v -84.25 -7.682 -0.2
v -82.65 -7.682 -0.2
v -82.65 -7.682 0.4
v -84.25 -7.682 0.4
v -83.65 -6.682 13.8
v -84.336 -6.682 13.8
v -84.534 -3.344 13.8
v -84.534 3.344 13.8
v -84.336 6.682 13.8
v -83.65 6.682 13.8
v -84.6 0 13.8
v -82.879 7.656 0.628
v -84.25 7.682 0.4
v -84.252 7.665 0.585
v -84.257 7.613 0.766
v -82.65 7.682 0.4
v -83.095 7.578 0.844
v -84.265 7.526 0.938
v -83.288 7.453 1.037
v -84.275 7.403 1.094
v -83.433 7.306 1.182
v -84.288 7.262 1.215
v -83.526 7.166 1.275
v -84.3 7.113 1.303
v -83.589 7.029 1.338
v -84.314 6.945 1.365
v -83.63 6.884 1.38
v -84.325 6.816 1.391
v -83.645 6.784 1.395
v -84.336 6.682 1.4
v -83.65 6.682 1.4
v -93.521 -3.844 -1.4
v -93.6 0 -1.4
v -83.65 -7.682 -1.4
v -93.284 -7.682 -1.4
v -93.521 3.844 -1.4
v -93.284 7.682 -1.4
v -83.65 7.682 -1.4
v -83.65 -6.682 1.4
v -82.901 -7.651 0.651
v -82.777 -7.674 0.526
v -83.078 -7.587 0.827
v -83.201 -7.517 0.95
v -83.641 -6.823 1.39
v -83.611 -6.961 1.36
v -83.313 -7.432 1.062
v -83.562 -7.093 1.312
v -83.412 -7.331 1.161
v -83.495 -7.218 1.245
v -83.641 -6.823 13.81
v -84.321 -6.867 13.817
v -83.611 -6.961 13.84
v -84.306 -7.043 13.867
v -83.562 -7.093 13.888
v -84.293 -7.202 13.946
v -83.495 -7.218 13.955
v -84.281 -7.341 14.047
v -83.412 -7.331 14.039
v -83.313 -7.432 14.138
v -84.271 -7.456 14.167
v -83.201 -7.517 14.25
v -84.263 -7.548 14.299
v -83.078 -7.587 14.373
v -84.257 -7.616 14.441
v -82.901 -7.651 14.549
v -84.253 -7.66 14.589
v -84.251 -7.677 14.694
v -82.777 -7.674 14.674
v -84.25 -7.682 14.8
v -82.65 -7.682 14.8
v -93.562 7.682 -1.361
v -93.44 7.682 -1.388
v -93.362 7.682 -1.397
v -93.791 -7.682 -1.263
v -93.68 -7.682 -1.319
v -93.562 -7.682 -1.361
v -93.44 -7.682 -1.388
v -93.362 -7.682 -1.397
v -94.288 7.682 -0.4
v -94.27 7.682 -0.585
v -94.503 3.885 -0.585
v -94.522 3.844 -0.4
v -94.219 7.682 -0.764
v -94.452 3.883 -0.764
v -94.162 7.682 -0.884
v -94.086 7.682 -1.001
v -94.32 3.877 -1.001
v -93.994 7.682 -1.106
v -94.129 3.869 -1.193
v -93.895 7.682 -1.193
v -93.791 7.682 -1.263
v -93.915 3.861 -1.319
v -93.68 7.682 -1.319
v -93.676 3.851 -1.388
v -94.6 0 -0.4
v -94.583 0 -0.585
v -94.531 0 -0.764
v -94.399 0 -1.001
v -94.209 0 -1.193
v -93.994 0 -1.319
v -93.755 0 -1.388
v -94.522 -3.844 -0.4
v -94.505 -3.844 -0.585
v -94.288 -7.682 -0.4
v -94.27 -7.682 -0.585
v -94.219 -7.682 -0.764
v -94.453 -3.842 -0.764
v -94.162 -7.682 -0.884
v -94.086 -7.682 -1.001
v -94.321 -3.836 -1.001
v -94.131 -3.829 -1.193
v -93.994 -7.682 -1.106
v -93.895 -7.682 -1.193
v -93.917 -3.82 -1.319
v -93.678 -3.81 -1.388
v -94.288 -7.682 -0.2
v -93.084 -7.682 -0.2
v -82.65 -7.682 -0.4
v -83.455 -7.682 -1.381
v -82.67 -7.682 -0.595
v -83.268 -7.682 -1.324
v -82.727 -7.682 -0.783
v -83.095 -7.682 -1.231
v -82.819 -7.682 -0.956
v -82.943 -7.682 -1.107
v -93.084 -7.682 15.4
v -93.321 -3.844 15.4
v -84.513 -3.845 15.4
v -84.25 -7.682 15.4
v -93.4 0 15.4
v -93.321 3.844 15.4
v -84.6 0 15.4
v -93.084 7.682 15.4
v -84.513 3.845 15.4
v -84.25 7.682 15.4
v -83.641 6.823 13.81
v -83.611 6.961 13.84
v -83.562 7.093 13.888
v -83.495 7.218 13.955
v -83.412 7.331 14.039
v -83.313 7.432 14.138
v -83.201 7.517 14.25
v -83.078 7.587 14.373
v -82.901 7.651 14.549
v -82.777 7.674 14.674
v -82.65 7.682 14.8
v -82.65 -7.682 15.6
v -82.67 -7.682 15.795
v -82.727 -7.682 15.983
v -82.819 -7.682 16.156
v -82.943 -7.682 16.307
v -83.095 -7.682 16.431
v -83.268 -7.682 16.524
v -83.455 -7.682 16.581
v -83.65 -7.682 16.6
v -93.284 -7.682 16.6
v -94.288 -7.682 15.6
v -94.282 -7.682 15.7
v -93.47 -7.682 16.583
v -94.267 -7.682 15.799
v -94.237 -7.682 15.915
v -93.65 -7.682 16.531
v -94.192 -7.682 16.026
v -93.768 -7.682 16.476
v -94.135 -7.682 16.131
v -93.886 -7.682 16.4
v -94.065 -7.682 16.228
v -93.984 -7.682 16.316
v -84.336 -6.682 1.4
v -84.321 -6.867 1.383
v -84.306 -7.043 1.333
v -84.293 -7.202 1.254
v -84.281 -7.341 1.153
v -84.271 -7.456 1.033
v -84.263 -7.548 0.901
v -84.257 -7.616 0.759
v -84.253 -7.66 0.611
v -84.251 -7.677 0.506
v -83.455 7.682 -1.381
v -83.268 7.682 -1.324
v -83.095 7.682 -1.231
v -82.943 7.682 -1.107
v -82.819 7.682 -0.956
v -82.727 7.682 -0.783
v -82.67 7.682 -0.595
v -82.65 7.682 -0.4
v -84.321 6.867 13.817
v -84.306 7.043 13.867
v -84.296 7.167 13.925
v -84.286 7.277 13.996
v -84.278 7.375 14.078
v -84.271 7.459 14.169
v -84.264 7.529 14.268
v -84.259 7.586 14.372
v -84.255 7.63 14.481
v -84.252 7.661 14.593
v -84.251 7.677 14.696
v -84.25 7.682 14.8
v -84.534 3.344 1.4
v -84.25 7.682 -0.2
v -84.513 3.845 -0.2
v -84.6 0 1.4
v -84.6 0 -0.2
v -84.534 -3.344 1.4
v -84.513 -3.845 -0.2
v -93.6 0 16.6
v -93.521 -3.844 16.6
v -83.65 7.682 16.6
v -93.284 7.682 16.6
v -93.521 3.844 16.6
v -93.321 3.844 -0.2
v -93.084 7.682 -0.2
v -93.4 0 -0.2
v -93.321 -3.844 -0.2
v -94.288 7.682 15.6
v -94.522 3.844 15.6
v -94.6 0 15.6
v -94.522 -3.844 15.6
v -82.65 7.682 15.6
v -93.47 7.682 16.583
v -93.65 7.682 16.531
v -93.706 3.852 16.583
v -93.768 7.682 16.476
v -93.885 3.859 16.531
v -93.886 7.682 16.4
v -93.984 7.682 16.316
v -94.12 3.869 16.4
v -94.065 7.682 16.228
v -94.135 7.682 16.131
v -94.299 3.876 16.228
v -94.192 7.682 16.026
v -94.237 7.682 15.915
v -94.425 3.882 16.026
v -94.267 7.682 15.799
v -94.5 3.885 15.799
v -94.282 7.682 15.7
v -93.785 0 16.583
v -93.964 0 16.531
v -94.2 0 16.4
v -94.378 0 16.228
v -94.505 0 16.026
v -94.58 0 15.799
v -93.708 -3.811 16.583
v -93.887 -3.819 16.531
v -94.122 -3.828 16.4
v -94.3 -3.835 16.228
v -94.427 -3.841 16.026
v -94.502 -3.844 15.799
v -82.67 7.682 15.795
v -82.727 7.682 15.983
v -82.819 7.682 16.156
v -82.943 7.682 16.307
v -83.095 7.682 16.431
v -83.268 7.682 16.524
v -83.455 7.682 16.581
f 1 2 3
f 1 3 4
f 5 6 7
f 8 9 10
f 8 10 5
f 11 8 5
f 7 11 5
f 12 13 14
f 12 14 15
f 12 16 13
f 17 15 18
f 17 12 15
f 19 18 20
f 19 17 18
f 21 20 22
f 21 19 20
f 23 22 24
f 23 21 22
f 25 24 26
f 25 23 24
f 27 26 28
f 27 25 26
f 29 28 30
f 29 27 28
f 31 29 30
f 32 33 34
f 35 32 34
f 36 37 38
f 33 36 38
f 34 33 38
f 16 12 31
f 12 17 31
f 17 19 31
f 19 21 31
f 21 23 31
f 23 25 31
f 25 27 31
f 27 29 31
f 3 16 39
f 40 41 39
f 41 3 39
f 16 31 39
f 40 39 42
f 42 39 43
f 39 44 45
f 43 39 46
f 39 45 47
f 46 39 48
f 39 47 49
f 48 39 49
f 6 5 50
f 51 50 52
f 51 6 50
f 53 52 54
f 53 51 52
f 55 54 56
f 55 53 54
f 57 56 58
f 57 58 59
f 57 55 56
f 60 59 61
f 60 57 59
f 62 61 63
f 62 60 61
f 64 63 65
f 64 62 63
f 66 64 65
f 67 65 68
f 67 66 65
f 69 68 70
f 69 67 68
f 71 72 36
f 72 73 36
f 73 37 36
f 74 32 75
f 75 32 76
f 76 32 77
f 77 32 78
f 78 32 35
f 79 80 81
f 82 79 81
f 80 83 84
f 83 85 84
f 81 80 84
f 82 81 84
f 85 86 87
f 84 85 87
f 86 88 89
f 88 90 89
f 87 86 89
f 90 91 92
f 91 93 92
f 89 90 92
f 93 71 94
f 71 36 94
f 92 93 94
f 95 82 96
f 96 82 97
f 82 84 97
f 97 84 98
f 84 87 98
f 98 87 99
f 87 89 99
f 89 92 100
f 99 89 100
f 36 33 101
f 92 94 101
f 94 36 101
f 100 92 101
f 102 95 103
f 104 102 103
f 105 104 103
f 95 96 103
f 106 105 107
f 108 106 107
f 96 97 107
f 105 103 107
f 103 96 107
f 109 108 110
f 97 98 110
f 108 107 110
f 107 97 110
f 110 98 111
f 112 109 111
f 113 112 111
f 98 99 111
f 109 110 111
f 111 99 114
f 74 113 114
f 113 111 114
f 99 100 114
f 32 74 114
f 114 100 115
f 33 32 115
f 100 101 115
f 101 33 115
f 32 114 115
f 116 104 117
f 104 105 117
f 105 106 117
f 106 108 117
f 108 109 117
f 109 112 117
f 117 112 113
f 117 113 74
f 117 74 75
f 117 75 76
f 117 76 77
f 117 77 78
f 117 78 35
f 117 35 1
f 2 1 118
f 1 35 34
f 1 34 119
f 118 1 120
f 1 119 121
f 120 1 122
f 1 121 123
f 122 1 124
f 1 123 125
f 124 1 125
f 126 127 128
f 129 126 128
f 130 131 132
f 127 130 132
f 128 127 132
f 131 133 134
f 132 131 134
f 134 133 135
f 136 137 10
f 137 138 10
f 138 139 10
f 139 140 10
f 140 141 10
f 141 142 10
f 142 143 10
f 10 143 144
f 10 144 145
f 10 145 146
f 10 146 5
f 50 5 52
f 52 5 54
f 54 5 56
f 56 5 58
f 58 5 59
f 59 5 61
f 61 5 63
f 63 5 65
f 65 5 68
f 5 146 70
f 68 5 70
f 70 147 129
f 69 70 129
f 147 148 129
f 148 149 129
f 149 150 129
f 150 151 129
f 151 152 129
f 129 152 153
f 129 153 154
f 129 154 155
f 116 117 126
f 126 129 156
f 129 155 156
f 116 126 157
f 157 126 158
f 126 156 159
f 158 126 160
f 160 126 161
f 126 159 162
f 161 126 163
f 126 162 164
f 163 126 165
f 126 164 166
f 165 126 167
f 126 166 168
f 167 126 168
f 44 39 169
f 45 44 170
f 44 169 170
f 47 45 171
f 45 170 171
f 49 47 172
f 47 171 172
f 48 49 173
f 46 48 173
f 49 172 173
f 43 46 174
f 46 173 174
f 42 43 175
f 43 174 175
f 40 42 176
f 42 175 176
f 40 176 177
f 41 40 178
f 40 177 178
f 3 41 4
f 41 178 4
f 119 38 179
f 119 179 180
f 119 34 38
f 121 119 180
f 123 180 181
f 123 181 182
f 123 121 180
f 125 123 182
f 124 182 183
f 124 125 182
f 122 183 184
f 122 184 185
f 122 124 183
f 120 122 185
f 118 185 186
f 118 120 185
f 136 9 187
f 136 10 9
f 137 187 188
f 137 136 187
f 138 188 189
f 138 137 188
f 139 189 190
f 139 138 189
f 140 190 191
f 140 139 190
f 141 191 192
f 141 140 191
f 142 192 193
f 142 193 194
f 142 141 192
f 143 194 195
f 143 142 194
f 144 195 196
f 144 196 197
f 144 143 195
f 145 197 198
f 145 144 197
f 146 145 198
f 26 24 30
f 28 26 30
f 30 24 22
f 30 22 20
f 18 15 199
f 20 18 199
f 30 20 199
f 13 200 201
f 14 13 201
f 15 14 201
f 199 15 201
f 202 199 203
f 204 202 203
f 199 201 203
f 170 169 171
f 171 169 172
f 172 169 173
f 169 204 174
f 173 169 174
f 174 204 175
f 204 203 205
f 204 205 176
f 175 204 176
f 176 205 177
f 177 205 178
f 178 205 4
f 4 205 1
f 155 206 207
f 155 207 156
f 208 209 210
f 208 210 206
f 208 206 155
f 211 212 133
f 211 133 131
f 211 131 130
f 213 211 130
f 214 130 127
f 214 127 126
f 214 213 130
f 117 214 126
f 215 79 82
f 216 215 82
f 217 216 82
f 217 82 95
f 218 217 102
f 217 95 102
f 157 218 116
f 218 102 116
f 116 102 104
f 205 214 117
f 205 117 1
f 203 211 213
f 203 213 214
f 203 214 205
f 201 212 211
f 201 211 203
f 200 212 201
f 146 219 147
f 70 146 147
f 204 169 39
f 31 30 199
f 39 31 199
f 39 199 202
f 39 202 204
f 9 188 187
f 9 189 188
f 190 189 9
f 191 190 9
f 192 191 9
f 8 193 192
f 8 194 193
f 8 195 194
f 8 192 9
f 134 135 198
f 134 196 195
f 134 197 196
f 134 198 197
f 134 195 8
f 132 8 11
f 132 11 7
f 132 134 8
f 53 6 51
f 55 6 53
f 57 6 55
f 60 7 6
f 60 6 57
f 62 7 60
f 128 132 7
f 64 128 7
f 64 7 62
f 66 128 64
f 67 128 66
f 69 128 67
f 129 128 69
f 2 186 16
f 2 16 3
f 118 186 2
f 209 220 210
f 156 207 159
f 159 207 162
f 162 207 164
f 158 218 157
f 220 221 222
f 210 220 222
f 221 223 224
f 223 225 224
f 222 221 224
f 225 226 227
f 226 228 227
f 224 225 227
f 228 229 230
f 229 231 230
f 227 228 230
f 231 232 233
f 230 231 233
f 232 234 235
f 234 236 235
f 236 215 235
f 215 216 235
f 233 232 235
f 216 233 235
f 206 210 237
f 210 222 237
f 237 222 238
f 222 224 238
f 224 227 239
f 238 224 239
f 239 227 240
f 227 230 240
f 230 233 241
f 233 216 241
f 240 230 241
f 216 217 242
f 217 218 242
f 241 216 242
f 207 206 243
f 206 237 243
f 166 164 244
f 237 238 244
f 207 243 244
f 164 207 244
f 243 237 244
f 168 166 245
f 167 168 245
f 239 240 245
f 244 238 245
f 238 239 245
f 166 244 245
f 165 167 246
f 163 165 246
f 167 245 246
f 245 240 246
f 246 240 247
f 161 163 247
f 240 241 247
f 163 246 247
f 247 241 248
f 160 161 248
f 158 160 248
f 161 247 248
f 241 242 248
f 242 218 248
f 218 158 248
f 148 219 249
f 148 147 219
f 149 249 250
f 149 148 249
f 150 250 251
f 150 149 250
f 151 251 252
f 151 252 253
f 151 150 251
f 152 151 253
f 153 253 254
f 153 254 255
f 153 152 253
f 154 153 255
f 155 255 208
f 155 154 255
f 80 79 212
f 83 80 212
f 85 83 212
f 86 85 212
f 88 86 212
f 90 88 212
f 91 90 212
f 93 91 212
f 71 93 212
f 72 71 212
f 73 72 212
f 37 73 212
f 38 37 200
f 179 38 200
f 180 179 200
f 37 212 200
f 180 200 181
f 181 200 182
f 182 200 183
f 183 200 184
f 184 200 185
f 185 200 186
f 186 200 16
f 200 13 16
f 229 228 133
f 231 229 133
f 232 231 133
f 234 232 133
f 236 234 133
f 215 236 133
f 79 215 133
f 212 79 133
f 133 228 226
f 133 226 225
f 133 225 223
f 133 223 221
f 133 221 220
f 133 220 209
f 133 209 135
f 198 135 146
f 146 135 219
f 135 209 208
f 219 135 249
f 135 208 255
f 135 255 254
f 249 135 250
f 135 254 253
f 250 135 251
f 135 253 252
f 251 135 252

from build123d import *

# Parameters (mm, degrees)
PAD011_DEPTH    = 1.2
PAD012_DEPTH    = 15.6
PAD013_DEPTH    = 1.2
PAD014_DEPTH    = 1.6
PAD015_DEPTH    = 1.6
CHAMFER004_SIZE = 1
FILLET002_R     = 1


with BuildPart() as part:
    # Sketch018 → Pad011 (new body)
    with BuildSketch(Plane.XY):
        with BuildLine():
            ThreePointArc((-94.2875364362, 7.682478298), (-94.6, 0), (-94.2875364362, -7.682478298))
            Line((-94.2875364362, -7.682478298), (-82.6504571335, -7.6824782979))
            Line((-82.6504571335, 7.682478298), (-82.6504571335, -7.6824782979))
            Line((-94.2875364362, 7.682478298), (-82.6504571335, 7.682478298))
        make_face()
    extrude(amount=PAD011_DEPTH)

    # Sketch019 → Pad012 (join)
    with BuildSketch(Plane.XY.offset(1.2)):
        with BuildLine():
            ThreePointArc((-94.2875364362, 7.682478298), (-94.6, 0), (-94.2875364362, -7.682478298))
            Line((-93.0835083525, -7.682478298), (-94.2875364362, -7.682478298))
            ThreePointArc((-93.0835083525, 7.682478298), (-93.4, 0), (-93.0835083525, -7.682478298))
            Line((-94.2875364362, 7.682478298), (-93.0835083525, 7.682478298))
        make_face()
    extrude(amount=PAD012_DEPTH)

    # Sketch020 → Pad013 (join)
    with BuildSketch(Plane.XY.offset(16.8)):
        with BuildLine():
            ThreePointArc((-94.2875364362, 7.682478298), (-94.6, 0), (-94.2875364362, -7.682478298))
            Line((-94.2875364362, -7.682478298), (-82.6504571335, -7.682478298))
            Line((-82.6504571335, 7.682478298), (-82.6504571335, -7.682478298))
            Line((-94.2875364362, 7.682478298), (-82.6504571335, 7.682478298))
        make_face()
    extrude(amount=PAD013_DEPTH)

    # Sketch021 → Pad014 (join)
    with BuildSketch(Plane.XY.offset(1.2)):
        with BuildLine():
            ThreePointArc((-84.2504571335, 7.682478298), (-84.6, 0), (-84.2504571335, -7.682478298))
            Line((-82.6504571335, -7.682478298), (-84.2504571335, -7.682478298))
            Line((-82.6504571335, 7.682478298), (-82.6504571335, -7.682478298))
            Line((-84.2504571335, 7.682478298), (-82.6504571335, 7.682478298))
        make_face()
    extrude(amount=PAD014_DEPTH)

    # Sketch022 → Pad015 (join)
    with BuildSketch(Plane.XY.offset(16.8)):
        with BuildLine():
            ThreePointArc((-84.2504571335, 7.682478298), (-84.6, 0), (-84.2504571335, -7.682478298))
            Line((-82.6504571335, -7.682478298), (-84.2504571335, -7.682478298))
            Line((-82.6504571335, 7.682478298), (-82.6504571335, -7.682478298))
            Line((-84.2504571335, 7.682478298), (-82.6504571335, 7.682478298))
        make_face()
    extrude(amount=-PAD015_DEPTH)

    # Chamfer004
    chamfer004_edges = [part.edges().sort_by_distance(p)[0] for p in [
        (-82.650457, 0, 2.8),
        (-82.650457, 0, 15.2),
    ]]
    chamfer(chamfer004_edges, length=CHAMFER004_SIZE)

    # Fillet002
    fillet002_edges = [part.edges().sort_by_distance(p)[0] for p in [
        (-94.6, 0, 18),
        (-94.6, 0, 0),
        (-82.650457, 0, 18),
        (-82.650457, 0, 0),
        (-83.950457, -7.682478, 2.8),
        (-83.950457, 7.682478, 2.8),
        (-83.950457, 7.682478, 15.2),
        (-83.950457, -7.682478, 15.2),
    ]]
    fillet(fillet002_edges, radius=FILLET002_R)


with BuildPart() as part_1:
    # Body005 placement: moved
    add(part.part.moved(Location((0, 0, -1.4))))


solid = part_1.part
